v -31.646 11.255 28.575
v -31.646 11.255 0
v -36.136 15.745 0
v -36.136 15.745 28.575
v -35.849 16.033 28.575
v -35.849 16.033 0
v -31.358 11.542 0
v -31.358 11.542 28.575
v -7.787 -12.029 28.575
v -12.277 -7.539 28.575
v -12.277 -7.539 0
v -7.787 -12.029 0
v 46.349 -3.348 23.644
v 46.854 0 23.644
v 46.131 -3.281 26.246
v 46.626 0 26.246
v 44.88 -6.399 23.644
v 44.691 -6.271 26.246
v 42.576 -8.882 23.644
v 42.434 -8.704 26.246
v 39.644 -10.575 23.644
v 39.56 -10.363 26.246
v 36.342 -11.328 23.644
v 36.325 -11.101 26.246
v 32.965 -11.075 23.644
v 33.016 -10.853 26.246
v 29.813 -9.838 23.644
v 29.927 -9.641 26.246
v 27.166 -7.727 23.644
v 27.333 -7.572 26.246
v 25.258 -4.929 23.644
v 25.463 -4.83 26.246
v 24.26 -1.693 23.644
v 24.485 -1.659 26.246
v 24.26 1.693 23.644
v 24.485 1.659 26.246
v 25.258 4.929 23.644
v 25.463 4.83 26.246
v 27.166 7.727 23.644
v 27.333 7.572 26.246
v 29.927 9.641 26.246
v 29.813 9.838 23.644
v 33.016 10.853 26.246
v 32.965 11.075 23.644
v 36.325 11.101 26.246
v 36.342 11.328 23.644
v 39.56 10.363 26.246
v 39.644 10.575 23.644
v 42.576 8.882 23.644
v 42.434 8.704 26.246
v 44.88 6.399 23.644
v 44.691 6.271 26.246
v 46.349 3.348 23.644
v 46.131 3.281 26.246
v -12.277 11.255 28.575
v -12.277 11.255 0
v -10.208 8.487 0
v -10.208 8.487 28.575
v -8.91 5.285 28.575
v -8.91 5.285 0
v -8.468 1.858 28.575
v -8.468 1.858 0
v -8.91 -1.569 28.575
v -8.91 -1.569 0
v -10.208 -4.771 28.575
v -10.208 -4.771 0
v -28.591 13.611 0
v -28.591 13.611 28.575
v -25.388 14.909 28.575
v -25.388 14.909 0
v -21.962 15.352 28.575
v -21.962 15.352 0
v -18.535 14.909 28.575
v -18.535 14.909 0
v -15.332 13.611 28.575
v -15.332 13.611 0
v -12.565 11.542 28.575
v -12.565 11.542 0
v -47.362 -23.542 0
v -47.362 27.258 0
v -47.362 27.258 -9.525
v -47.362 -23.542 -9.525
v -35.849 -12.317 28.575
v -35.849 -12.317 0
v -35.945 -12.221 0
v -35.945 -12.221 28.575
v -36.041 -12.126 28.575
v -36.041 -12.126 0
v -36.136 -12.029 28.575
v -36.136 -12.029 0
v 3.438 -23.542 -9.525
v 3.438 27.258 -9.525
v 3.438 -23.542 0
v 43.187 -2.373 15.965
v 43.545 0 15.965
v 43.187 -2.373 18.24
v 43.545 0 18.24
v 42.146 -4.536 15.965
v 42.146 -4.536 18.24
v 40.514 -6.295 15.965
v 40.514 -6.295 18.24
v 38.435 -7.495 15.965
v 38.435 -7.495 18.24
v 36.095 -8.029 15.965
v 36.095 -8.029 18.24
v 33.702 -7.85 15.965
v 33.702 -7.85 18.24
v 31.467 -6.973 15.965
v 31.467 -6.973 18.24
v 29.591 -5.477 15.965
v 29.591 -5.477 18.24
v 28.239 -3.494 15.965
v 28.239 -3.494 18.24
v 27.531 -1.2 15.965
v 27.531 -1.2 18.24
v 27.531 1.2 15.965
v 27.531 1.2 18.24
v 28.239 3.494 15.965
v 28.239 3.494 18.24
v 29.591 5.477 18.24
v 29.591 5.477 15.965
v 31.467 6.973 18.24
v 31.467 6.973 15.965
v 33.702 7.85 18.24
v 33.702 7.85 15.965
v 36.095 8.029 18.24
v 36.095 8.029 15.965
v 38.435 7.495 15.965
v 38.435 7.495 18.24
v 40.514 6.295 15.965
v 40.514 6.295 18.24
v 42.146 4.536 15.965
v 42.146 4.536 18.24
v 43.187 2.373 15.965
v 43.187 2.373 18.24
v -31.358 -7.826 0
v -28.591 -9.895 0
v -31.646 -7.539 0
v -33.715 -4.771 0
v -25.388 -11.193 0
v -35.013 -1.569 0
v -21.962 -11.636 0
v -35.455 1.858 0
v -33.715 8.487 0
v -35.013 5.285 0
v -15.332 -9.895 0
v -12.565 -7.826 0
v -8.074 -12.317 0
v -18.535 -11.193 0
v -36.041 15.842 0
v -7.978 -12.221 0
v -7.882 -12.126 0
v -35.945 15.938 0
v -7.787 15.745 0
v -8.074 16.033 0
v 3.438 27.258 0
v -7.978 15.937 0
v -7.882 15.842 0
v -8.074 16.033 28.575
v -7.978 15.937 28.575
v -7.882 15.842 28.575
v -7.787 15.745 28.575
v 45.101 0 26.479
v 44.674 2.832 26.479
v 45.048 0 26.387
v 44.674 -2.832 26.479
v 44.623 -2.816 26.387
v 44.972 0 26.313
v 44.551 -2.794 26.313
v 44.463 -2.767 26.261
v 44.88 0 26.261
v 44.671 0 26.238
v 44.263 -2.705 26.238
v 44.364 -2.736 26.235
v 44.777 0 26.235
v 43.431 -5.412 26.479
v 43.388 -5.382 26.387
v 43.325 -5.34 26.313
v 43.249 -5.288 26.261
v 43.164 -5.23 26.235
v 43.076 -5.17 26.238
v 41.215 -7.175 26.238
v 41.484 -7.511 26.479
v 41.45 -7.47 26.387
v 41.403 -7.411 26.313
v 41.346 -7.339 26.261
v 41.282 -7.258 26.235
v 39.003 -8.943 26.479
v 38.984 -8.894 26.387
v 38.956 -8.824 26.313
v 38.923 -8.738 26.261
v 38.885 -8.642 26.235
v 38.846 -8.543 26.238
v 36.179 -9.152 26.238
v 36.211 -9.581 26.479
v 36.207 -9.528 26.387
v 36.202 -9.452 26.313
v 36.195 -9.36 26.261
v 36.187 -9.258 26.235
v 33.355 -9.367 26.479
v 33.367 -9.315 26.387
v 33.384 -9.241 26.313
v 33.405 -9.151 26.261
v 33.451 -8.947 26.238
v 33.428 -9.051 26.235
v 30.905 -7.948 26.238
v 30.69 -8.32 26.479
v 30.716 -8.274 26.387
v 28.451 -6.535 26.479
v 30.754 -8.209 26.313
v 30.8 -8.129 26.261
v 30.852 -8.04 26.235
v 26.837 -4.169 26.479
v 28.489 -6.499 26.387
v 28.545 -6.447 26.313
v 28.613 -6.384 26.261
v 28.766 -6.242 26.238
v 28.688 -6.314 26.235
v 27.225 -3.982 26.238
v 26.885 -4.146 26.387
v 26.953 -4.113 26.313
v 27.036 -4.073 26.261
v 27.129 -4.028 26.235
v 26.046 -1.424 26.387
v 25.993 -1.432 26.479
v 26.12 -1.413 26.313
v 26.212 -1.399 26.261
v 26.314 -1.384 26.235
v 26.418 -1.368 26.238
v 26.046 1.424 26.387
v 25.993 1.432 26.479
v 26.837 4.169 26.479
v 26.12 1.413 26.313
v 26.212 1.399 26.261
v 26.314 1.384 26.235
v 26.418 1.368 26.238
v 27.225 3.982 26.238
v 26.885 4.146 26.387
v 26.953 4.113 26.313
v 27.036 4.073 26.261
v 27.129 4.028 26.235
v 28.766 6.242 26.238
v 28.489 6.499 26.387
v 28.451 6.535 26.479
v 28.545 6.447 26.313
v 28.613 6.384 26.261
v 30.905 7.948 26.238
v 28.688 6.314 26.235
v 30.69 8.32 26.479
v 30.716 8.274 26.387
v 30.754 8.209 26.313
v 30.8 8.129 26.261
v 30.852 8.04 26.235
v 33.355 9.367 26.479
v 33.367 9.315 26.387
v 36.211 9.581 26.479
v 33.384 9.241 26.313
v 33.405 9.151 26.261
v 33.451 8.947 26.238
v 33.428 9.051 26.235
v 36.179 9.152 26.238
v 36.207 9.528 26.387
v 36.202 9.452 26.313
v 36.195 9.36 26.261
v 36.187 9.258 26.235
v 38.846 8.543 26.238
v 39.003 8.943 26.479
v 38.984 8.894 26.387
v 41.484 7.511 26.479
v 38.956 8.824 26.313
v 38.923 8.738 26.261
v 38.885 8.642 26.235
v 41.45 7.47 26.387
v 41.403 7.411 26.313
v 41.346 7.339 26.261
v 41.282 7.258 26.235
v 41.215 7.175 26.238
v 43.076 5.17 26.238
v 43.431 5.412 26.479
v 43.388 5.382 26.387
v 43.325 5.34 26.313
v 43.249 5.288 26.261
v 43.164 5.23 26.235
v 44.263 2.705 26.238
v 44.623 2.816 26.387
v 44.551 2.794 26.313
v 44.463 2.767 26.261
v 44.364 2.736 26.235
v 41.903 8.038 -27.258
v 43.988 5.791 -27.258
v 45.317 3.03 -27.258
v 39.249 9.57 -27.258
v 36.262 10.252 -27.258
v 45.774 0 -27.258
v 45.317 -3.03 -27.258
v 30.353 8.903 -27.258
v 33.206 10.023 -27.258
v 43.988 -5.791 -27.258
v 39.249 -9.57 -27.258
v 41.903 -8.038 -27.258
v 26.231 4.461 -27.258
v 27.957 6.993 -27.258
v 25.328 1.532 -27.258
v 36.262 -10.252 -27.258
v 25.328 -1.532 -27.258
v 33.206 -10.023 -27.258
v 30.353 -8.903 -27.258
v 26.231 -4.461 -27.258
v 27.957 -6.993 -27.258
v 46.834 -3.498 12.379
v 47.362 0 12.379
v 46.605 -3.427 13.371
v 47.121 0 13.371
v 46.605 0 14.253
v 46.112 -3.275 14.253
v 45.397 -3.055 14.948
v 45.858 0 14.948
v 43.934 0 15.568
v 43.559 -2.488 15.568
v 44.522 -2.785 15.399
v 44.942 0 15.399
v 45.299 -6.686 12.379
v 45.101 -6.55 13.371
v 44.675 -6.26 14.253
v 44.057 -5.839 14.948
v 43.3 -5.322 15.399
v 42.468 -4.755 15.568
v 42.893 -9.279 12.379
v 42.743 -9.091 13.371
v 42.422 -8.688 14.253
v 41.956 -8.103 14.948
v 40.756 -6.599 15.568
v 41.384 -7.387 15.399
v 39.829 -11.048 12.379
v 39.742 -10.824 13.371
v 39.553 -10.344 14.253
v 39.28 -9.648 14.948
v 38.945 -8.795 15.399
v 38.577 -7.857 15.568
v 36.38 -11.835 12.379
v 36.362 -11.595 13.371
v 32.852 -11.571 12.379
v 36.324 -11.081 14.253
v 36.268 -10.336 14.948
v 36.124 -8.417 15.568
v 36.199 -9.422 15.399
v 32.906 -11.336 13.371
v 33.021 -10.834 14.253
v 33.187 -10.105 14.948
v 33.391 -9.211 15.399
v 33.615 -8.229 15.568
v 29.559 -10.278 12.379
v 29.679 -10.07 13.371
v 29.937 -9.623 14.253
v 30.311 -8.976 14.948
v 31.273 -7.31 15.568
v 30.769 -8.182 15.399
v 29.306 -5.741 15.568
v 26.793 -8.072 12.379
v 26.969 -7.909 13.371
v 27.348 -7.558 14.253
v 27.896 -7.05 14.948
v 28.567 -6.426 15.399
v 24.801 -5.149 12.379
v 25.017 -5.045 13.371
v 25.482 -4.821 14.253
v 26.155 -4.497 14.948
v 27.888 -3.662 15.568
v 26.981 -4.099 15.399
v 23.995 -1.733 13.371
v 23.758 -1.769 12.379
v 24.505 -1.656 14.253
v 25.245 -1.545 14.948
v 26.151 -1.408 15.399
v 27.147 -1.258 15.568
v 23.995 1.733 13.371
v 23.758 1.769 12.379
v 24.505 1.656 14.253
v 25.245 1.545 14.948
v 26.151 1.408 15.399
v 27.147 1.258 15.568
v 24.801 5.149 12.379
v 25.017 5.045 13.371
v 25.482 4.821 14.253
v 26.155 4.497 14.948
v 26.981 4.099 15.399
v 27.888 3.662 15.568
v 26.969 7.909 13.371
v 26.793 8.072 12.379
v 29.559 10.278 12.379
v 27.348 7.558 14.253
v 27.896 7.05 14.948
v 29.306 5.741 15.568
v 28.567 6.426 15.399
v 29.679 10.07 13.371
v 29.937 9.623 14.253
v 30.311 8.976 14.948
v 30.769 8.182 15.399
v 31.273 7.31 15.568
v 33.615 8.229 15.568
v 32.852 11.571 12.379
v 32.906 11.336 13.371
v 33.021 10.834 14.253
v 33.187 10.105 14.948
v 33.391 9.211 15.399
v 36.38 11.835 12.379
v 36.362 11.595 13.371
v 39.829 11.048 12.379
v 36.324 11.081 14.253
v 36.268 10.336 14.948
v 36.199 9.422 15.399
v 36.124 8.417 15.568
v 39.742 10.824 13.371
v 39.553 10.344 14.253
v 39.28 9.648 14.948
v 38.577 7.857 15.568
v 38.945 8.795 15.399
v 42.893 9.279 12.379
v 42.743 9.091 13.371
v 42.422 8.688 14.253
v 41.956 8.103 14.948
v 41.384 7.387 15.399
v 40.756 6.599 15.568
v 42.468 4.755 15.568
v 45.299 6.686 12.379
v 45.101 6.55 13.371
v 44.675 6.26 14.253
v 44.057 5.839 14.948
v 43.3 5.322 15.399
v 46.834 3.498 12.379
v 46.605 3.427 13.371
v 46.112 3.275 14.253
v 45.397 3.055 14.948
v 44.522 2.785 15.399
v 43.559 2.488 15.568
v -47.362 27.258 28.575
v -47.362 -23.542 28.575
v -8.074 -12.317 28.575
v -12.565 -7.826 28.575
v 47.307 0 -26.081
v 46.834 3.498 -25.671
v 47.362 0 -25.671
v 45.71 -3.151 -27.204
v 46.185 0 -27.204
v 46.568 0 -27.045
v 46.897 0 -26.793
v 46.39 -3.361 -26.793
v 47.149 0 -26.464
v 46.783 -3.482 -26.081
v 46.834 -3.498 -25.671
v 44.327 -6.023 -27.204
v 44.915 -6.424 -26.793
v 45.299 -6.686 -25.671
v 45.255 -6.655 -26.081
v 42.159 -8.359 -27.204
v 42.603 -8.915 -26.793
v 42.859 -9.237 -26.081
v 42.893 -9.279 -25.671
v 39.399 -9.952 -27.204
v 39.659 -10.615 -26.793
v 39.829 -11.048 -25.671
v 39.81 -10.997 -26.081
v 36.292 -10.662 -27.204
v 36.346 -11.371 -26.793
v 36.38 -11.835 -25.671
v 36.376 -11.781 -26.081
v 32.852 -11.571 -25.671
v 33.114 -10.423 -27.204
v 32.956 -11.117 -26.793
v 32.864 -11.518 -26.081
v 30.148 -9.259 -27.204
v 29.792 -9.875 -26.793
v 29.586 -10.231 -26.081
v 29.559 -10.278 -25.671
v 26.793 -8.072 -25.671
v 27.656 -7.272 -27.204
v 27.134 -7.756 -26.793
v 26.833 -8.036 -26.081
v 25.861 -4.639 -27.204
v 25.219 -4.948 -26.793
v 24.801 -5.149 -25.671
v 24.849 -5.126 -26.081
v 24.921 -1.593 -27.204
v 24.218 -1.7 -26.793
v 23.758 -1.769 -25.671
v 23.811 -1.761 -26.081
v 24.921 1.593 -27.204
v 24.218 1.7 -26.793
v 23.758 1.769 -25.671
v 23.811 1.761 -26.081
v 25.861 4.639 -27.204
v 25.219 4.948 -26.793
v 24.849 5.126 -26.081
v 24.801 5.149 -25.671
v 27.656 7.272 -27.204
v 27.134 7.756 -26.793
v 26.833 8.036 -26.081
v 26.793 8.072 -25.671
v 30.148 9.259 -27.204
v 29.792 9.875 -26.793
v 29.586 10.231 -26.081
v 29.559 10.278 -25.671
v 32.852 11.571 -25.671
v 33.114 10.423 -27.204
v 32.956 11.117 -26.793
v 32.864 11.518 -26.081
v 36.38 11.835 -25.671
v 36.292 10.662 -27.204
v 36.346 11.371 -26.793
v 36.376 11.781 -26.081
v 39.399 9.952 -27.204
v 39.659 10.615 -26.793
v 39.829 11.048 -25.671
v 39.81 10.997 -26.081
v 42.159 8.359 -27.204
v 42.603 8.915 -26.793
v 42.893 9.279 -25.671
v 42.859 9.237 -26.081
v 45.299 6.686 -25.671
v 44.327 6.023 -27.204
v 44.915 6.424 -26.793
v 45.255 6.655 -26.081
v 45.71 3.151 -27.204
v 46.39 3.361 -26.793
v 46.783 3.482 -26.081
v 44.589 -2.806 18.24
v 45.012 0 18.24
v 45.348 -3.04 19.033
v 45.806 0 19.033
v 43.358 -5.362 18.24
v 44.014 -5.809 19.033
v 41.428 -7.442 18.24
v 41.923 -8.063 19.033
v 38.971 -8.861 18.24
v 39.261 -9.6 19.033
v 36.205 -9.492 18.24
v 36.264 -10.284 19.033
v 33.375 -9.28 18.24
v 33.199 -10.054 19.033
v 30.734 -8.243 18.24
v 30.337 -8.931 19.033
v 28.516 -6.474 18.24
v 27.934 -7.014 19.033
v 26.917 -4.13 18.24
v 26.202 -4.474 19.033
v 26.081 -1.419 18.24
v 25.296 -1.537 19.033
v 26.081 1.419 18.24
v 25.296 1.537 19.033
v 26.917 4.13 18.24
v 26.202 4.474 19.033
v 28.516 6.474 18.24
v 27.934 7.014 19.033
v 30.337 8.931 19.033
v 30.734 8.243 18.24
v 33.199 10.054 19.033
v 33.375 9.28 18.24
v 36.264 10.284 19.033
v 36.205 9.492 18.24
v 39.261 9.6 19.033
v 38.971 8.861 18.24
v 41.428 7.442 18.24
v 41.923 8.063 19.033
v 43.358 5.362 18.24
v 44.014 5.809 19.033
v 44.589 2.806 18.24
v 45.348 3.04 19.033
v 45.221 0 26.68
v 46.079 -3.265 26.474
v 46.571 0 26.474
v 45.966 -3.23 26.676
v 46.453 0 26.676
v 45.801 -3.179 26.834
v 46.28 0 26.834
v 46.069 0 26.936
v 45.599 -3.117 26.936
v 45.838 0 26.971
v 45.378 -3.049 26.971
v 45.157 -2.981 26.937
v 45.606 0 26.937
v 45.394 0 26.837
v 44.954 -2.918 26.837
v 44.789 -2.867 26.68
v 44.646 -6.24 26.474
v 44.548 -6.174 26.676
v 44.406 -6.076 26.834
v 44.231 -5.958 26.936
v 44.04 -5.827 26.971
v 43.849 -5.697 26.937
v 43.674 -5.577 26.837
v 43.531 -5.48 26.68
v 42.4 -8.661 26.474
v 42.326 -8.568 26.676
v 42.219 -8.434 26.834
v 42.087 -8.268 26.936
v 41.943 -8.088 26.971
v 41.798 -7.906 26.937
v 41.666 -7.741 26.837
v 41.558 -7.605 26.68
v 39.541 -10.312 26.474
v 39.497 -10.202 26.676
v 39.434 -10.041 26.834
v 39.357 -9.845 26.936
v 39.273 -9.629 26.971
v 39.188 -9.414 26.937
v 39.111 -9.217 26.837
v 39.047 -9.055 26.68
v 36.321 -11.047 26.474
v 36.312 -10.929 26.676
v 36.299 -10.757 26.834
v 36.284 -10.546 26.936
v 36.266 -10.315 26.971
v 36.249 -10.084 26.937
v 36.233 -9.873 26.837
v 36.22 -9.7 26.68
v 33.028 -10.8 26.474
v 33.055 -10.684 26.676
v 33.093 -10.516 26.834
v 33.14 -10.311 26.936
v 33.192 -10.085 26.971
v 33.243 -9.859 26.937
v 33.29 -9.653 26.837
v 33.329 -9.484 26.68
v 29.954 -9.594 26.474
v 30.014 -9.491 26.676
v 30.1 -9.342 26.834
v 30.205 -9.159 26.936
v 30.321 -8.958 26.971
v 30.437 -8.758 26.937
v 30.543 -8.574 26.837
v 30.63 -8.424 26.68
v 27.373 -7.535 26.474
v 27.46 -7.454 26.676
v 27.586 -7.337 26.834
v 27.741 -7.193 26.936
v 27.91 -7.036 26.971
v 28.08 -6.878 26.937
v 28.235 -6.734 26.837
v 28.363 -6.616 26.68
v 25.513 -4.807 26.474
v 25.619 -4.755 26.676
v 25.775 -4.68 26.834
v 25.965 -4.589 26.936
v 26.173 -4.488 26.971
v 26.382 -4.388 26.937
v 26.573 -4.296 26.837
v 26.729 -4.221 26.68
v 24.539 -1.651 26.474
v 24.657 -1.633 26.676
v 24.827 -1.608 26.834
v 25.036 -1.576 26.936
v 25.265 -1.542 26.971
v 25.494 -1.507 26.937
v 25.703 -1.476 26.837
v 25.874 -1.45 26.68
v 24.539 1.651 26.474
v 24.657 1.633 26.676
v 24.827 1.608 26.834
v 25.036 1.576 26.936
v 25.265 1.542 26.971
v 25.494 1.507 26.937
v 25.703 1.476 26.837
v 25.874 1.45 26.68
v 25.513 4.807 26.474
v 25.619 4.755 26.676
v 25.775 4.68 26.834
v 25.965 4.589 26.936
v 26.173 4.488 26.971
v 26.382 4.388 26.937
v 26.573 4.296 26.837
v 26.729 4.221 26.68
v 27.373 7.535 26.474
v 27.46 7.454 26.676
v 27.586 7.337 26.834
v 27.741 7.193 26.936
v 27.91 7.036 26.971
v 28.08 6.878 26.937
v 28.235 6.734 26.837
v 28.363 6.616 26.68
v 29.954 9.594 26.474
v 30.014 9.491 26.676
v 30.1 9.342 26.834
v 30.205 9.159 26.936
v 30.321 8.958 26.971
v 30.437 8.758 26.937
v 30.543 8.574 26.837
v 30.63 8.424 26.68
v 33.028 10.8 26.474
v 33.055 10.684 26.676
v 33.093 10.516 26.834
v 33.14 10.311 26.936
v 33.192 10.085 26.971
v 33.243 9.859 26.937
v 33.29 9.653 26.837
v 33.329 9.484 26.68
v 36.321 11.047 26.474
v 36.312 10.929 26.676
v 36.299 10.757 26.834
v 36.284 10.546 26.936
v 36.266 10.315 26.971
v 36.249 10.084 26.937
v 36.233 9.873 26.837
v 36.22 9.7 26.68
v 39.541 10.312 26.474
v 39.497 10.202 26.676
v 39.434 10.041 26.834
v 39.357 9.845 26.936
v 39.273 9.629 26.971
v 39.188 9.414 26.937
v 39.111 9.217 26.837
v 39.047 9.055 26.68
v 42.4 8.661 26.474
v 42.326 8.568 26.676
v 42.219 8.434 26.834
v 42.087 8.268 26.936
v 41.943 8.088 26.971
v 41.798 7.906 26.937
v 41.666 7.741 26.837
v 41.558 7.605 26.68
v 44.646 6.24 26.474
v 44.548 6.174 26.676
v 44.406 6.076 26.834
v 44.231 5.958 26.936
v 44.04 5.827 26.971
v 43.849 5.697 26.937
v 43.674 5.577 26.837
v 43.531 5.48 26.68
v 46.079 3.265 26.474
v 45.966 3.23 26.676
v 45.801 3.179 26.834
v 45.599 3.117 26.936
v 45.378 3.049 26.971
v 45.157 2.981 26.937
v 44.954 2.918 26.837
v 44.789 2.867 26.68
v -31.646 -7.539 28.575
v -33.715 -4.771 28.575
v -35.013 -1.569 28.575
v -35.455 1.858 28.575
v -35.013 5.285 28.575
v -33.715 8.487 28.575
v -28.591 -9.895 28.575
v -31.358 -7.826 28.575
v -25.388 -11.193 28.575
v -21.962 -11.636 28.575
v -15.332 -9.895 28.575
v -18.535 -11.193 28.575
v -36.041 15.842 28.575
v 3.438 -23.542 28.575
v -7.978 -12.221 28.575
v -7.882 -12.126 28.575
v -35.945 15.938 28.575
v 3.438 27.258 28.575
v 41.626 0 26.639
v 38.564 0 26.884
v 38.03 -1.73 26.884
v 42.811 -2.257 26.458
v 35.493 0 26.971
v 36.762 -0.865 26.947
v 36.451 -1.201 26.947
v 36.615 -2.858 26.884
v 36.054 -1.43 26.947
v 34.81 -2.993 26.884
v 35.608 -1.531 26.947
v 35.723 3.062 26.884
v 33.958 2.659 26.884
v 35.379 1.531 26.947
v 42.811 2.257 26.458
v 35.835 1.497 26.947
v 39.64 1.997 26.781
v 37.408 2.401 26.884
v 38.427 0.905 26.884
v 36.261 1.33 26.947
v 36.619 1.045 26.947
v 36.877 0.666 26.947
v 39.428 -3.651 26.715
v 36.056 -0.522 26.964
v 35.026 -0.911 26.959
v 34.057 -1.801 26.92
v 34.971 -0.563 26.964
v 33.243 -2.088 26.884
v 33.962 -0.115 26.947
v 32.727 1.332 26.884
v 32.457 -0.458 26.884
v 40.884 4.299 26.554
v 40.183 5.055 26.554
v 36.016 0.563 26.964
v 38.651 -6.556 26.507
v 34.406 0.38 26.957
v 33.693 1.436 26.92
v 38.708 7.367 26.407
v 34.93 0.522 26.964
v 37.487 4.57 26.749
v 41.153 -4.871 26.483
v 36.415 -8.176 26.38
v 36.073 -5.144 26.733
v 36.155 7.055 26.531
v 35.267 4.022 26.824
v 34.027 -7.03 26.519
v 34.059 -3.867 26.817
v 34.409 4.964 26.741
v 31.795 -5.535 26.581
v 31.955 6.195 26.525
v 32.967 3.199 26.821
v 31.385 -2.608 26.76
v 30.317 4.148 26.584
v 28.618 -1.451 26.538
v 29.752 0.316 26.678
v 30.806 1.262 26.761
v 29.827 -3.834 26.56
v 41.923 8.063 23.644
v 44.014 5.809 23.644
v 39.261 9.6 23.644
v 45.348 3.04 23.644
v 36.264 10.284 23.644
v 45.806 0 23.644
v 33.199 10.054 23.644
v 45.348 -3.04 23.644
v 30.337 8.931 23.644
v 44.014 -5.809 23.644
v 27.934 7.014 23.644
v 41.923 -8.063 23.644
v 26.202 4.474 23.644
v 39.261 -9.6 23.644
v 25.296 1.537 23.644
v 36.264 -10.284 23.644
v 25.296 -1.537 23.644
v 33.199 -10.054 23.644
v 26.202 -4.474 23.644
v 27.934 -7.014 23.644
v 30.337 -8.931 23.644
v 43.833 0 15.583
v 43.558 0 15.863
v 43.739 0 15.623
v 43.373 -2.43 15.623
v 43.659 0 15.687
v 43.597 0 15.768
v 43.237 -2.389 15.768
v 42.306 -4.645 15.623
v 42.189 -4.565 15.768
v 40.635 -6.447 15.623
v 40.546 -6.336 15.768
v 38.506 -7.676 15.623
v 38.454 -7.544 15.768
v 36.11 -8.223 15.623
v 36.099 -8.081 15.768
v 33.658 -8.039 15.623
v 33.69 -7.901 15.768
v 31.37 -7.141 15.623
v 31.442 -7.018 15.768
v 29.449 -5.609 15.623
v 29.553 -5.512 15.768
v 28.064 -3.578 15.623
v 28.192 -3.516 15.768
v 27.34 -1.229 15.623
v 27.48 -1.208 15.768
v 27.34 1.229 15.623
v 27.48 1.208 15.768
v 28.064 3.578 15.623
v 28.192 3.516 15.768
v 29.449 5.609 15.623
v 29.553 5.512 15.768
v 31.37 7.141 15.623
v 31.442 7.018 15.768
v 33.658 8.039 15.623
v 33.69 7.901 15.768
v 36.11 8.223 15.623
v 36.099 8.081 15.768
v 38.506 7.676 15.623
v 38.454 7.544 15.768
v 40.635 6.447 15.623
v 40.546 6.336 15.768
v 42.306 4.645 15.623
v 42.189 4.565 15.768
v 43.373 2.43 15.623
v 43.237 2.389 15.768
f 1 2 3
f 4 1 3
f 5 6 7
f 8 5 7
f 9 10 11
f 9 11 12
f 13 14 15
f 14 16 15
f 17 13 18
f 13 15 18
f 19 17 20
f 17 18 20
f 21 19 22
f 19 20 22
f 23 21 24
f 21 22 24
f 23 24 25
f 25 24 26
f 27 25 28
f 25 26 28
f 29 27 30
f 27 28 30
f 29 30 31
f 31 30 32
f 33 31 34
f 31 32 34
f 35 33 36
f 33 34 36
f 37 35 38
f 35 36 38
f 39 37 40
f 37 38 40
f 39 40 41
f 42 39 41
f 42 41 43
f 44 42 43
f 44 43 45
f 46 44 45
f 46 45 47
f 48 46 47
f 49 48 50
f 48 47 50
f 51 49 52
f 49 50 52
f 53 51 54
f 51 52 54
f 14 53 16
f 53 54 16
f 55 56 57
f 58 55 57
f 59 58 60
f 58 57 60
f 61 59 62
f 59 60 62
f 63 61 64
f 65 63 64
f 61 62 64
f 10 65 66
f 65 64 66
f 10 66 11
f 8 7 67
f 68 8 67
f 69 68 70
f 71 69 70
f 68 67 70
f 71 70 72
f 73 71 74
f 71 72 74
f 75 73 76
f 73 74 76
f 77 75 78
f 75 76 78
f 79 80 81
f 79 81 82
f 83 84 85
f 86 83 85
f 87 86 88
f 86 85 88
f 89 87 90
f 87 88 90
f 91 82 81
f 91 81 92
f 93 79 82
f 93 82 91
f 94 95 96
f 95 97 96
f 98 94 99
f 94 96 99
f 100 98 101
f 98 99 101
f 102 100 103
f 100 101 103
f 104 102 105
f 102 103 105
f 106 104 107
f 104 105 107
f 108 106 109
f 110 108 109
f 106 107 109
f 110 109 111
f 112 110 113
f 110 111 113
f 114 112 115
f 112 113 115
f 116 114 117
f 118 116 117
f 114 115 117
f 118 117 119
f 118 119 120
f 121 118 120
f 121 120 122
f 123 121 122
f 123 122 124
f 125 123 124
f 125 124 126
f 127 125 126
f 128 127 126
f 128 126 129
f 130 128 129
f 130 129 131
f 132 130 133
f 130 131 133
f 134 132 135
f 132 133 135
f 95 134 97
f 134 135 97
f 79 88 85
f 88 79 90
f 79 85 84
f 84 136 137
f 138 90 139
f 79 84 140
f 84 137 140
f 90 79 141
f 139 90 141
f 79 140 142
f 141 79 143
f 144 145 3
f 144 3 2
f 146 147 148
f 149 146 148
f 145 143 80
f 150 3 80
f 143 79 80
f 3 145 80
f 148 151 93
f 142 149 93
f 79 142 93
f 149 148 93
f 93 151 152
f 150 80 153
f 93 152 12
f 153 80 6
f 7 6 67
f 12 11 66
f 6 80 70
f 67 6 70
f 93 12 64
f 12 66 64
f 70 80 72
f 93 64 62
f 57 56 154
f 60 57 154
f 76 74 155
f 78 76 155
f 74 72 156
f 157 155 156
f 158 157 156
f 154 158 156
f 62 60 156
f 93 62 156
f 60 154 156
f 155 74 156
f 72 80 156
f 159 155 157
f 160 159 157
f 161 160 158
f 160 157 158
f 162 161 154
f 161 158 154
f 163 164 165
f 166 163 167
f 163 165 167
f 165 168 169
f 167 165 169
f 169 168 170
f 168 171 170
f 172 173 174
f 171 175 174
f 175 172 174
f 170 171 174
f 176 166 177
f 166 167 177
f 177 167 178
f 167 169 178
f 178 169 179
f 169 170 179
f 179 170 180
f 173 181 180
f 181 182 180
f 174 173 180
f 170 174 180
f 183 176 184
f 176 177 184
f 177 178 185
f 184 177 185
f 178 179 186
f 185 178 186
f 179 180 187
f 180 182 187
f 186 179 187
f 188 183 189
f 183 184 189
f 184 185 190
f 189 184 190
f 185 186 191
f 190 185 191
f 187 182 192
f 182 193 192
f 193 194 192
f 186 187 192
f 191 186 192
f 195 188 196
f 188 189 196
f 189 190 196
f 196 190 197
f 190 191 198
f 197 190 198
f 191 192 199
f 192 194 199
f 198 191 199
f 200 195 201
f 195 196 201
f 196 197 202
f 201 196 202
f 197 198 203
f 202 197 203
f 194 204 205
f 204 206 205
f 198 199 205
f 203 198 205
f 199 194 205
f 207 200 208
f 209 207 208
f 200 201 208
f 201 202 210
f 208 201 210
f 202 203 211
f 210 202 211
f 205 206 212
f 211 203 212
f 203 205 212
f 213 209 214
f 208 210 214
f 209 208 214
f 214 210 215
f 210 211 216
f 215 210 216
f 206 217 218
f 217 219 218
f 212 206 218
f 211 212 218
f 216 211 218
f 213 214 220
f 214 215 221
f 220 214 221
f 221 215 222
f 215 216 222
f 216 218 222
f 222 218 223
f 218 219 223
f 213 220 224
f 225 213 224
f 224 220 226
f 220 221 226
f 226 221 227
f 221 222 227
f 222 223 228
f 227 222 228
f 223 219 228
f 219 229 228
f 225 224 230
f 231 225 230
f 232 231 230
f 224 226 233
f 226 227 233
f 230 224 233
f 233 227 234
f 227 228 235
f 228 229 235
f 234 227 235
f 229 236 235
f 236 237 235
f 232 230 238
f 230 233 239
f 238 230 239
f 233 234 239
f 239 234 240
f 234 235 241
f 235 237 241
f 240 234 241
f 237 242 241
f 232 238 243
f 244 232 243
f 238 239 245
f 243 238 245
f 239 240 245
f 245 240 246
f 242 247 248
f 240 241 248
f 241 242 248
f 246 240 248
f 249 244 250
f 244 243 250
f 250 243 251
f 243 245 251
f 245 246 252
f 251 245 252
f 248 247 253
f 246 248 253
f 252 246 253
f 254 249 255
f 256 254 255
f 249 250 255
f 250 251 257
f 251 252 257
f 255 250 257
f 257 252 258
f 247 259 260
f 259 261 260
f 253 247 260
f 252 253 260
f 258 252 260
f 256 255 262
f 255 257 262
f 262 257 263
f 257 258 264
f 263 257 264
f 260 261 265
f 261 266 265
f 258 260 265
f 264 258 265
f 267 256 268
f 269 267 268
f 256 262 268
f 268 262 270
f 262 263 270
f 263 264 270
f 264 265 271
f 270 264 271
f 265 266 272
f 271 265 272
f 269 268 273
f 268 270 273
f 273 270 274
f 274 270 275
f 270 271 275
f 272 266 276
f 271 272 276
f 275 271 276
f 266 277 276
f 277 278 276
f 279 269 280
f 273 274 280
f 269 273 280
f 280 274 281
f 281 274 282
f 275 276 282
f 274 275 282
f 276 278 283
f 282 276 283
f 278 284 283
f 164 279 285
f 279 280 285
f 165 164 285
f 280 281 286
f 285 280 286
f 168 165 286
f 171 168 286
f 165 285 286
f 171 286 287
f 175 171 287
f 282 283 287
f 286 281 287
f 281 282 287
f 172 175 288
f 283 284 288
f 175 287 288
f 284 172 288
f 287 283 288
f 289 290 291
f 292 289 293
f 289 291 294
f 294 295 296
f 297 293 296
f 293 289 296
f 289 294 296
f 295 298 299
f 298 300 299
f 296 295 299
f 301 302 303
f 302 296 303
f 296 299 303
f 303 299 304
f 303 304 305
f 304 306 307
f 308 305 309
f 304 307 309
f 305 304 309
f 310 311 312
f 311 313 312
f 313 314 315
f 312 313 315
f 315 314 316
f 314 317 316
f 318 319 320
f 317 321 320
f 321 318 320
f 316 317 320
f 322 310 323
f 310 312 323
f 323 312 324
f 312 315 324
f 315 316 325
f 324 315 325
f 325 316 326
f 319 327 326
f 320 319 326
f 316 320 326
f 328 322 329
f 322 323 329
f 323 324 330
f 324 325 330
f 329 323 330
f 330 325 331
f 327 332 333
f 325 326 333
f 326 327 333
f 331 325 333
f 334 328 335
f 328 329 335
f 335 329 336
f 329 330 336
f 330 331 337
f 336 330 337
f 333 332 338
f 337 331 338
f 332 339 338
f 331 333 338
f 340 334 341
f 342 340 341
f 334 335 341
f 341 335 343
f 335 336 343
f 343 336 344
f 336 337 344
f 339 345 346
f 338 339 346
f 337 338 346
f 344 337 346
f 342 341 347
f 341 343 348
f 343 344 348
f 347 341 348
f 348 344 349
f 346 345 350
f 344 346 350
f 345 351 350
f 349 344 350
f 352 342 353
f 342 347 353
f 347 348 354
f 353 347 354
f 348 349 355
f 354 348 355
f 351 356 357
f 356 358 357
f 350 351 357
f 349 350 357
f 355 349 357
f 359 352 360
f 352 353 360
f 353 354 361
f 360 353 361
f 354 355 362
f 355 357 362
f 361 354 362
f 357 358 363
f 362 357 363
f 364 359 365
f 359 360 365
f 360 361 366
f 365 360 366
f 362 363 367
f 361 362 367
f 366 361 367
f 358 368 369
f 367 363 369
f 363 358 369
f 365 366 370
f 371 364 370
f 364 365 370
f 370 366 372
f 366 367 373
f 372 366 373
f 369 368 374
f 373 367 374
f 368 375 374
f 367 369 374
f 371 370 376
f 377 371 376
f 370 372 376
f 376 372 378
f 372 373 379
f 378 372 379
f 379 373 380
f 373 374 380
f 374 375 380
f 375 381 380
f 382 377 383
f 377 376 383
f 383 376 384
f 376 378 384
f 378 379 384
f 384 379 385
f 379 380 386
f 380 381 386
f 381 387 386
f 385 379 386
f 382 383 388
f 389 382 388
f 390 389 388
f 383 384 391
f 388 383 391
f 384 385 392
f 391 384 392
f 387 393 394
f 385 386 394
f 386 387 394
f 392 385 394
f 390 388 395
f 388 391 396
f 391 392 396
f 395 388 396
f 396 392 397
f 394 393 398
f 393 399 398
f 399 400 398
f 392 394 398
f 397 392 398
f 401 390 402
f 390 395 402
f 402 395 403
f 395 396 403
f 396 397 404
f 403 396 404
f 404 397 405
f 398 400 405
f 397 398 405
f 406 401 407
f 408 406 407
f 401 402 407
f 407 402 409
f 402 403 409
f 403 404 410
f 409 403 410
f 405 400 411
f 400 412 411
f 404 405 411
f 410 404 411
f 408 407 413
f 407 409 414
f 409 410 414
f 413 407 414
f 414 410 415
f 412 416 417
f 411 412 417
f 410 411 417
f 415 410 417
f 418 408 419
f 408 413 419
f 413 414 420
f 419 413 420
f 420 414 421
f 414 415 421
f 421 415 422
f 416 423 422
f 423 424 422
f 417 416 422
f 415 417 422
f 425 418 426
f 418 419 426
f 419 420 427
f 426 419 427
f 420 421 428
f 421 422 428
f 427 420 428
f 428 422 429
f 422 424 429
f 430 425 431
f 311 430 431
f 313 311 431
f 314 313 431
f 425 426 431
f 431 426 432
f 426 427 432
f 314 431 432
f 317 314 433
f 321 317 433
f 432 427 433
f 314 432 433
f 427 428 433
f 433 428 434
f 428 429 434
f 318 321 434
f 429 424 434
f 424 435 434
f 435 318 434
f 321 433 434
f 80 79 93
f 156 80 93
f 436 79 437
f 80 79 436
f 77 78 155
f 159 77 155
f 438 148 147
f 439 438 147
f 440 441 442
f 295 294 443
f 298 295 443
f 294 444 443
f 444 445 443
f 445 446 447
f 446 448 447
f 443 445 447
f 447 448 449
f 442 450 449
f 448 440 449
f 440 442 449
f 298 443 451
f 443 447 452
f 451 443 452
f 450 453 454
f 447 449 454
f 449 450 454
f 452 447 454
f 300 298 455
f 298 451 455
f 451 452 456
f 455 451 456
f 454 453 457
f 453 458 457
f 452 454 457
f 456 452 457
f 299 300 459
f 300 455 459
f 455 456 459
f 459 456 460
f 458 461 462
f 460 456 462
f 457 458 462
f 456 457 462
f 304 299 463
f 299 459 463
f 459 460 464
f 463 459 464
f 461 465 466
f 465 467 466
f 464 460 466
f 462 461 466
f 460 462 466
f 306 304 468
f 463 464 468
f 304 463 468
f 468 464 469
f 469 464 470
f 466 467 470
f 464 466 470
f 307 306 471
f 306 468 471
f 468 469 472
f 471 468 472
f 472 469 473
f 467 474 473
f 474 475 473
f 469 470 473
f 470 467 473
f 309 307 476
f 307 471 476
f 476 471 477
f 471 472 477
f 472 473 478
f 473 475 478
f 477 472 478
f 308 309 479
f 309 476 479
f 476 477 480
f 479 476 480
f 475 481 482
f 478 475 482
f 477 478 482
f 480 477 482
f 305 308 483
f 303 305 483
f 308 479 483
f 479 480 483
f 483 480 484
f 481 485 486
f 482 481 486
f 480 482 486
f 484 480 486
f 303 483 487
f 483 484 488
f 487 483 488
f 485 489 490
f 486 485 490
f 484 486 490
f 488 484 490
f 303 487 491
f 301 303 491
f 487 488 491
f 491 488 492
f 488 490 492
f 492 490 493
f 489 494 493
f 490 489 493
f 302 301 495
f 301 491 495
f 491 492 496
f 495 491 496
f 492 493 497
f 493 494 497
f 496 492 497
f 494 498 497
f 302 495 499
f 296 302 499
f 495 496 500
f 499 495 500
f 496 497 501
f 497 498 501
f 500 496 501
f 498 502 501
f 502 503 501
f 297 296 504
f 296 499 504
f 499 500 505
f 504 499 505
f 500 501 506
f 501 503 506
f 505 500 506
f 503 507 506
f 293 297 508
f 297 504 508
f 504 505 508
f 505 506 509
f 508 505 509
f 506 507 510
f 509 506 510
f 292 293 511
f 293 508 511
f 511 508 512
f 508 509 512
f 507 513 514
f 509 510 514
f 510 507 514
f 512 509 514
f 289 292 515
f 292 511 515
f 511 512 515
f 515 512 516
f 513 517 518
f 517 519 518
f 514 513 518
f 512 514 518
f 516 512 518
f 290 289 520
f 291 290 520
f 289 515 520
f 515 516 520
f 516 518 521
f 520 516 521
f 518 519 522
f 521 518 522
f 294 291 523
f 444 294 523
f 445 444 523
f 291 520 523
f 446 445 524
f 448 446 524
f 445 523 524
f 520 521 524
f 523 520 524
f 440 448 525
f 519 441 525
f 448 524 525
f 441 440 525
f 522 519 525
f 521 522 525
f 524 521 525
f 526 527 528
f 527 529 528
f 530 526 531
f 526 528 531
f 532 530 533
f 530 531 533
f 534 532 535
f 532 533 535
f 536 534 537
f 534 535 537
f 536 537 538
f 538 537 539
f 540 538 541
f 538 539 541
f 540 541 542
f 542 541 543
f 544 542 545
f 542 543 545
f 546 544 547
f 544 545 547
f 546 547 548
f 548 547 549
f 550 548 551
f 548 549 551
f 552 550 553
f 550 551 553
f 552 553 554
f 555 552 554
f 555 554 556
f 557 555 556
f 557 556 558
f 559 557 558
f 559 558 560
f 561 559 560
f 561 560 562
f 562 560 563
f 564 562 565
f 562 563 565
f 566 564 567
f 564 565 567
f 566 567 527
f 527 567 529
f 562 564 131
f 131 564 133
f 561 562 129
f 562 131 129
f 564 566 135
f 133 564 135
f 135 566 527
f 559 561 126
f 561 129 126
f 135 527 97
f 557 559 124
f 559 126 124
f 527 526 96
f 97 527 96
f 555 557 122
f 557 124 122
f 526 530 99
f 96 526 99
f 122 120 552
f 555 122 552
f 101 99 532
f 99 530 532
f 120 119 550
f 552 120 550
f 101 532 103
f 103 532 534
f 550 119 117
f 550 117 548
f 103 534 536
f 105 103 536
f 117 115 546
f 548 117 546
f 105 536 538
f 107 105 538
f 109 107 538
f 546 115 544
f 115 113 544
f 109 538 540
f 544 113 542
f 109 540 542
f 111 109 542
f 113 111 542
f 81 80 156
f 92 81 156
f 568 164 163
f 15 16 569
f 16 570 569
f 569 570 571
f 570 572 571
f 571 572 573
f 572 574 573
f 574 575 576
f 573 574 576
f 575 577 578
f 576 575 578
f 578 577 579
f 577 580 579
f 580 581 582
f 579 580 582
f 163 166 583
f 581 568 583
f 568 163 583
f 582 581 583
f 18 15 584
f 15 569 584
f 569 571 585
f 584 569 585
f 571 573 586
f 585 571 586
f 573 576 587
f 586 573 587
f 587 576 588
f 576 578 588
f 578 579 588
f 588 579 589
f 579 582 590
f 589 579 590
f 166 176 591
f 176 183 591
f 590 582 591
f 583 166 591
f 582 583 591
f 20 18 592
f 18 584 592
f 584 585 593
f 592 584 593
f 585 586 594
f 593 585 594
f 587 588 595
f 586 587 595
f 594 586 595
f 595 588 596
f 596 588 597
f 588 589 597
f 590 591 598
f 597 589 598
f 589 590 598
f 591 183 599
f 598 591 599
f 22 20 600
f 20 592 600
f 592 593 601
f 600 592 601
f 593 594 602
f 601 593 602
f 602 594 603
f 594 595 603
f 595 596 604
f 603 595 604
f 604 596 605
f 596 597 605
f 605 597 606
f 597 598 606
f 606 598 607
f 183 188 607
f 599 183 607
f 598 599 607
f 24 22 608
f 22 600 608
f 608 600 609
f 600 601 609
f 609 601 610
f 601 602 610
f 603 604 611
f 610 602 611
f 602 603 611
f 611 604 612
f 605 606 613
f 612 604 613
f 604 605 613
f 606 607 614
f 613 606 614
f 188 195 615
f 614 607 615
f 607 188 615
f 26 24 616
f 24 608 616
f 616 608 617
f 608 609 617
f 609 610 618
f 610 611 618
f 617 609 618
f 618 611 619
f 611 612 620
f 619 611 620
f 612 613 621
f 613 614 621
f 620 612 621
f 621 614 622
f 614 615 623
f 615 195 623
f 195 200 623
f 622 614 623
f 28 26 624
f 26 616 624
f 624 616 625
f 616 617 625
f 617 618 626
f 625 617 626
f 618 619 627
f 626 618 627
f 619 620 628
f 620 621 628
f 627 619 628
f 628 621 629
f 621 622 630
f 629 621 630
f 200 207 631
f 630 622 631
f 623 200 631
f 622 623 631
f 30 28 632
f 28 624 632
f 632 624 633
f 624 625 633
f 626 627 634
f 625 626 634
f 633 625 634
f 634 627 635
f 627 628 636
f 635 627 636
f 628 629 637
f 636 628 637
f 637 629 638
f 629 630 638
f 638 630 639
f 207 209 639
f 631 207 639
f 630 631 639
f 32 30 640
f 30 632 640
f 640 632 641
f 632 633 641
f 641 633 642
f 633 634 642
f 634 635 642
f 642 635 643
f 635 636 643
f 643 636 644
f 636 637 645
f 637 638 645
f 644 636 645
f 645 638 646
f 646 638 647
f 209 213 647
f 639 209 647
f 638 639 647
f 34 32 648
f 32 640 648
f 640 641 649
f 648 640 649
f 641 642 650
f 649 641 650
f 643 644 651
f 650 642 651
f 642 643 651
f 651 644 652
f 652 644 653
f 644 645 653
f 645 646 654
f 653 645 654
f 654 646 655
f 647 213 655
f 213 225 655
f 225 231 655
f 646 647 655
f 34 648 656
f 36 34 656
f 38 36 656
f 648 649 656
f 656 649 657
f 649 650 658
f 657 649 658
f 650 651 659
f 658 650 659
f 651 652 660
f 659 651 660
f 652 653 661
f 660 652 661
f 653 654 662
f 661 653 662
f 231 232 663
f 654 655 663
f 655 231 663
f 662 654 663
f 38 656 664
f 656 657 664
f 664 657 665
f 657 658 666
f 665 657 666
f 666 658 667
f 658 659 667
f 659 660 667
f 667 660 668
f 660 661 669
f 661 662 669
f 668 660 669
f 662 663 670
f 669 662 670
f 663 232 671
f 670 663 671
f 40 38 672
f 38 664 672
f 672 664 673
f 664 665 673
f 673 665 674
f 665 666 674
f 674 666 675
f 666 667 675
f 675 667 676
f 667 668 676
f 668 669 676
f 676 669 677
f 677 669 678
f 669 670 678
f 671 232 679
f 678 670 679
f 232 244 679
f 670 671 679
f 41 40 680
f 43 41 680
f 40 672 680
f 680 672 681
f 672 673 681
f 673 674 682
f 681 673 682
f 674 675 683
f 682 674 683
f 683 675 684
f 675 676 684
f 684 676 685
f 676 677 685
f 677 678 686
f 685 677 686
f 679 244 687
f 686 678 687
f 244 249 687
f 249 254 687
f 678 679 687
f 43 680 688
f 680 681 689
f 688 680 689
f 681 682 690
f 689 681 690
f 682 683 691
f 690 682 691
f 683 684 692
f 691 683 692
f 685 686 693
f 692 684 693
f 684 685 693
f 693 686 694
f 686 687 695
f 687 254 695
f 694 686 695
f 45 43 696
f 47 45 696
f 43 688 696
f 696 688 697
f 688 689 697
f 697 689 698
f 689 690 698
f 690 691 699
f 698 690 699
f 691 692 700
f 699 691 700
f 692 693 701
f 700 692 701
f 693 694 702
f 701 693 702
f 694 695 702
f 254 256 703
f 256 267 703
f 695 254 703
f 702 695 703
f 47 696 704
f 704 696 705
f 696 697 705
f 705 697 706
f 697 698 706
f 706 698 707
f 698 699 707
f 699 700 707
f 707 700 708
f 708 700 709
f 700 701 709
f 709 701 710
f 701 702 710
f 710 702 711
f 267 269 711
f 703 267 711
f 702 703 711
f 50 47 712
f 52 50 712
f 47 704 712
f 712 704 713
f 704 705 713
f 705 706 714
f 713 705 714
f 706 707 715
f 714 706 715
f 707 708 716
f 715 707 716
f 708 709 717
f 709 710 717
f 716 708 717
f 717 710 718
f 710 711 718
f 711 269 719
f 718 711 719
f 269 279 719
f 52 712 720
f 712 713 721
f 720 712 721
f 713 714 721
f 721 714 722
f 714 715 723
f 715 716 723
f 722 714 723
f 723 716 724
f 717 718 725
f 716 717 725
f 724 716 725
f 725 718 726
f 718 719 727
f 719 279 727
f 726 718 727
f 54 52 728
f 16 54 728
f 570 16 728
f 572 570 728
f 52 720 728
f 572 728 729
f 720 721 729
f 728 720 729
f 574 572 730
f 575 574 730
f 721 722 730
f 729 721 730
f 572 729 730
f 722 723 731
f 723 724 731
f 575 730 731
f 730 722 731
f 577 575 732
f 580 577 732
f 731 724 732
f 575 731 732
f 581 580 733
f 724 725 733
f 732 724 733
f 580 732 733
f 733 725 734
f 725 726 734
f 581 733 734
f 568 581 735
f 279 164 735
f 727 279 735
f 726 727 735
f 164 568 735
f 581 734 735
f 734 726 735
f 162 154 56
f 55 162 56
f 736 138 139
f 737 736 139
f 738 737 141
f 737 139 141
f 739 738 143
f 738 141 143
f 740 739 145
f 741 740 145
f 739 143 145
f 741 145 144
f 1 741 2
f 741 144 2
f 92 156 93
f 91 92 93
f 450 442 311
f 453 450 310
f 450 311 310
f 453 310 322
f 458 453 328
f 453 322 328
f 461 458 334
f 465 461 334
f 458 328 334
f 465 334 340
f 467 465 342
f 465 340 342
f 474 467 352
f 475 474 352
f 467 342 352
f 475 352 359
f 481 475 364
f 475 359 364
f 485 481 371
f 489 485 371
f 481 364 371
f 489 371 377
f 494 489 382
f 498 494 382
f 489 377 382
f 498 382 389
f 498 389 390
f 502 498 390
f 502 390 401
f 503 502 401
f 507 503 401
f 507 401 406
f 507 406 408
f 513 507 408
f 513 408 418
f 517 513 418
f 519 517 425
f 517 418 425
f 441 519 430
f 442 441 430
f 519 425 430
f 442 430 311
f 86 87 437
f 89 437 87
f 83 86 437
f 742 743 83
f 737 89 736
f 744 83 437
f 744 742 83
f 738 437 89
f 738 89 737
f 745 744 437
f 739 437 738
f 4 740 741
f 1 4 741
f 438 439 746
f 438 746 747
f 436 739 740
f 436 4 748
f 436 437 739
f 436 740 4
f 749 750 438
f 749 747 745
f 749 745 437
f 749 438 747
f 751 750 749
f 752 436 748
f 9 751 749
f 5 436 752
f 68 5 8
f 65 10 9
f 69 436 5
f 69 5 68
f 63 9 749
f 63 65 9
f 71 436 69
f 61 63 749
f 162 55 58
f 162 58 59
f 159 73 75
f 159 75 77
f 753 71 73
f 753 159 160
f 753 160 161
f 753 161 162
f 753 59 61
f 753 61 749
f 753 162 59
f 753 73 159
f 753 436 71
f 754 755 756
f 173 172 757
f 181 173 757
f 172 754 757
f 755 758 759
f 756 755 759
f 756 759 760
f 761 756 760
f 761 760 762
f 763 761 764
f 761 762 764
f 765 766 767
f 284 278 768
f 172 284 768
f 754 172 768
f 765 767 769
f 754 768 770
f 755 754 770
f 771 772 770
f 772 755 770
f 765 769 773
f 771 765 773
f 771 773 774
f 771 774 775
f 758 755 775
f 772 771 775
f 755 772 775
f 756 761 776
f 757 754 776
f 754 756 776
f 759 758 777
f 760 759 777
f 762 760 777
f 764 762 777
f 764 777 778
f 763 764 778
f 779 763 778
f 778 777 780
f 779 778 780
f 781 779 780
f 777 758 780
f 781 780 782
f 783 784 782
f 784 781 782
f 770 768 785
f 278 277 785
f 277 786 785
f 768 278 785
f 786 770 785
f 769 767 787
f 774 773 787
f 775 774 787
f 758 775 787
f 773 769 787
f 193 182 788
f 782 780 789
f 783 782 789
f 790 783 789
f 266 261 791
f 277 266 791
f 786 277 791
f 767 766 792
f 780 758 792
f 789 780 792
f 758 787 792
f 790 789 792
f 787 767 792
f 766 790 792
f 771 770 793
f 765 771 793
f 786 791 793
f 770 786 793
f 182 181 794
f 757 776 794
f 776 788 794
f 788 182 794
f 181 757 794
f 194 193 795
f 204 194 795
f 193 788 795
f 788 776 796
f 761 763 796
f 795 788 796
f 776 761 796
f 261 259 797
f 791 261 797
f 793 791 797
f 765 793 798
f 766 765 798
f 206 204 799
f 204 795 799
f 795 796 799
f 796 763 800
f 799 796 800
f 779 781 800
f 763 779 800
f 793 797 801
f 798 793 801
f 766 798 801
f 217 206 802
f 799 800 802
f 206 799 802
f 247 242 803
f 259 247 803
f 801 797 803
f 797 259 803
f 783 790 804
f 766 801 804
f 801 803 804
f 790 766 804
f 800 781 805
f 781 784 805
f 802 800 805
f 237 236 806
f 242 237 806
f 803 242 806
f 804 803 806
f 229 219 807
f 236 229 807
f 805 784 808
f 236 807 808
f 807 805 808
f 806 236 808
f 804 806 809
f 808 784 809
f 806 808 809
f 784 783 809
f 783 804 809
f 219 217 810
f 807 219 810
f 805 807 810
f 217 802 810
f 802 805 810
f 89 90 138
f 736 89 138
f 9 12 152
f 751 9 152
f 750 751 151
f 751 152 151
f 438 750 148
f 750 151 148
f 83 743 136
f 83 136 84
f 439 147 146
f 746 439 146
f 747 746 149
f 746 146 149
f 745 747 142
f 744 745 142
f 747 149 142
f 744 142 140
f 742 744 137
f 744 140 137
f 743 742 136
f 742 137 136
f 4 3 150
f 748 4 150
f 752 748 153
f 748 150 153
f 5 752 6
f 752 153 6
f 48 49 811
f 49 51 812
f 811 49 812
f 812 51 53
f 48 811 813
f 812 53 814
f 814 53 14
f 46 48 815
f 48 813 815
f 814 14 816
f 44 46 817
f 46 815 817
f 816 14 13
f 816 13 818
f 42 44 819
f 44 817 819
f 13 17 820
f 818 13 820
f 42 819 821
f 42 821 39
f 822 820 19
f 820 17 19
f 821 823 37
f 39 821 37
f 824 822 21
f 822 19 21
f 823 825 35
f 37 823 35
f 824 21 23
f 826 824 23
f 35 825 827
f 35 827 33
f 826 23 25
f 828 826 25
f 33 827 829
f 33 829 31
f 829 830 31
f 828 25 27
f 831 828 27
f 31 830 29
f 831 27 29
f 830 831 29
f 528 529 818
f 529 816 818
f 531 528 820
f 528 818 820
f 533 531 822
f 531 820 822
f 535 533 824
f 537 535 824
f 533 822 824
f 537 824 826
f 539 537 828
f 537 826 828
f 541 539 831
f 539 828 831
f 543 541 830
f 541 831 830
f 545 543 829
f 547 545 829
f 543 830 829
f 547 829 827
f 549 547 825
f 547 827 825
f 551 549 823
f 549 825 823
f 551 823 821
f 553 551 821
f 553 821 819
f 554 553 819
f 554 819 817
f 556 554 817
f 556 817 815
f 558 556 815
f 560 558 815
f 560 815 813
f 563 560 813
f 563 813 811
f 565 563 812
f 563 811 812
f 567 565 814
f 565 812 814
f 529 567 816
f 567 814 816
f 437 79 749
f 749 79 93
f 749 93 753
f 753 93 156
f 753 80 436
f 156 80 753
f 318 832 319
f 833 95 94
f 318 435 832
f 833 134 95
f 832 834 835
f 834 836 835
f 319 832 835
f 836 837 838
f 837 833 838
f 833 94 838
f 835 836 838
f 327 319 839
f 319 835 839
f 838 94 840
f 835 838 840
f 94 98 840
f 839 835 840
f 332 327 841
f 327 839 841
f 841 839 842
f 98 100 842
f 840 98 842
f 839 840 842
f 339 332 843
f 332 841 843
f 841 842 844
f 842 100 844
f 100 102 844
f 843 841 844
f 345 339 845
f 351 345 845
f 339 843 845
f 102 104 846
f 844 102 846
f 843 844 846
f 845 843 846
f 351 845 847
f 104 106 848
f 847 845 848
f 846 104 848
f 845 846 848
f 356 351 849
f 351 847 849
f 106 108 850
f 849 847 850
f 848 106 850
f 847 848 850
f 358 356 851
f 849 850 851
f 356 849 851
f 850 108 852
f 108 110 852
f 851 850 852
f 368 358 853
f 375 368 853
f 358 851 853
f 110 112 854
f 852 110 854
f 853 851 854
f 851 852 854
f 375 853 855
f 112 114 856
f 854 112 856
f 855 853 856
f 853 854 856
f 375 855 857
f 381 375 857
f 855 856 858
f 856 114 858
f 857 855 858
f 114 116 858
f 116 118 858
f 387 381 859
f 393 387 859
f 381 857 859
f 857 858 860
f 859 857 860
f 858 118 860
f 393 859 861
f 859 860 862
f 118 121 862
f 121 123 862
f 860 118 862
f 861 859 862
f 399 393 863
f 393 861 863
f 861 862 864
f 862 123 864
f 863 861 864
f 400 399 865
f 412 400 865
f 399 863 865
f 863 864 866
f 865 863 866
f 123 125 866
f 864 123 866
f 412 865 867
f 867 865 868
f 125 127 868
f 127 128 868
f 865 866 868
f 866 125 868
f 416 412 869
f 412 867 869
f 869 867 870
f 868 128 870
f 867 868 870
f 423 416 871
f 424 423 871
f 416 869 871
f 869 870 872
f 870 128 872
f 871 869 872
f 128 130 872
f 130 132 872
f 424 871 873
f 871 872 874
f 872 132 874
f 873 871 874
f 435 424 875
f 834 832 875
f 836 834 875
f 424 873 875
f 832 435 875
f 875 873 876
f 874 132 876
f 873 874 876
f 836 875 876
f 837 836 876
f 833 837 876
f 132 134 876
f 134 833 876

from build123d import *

# Parameters (mm, degrees)
F0_W     = 50.8
F0_H     = 50.8
F1_DEPTH = 28.575
F2_W     = 50.8
F2_H     = 50.8
F3_DEPTH = 9.525


# Not quite as in the source:
# - ends of sketch curves that miss each other by under 0.0002 mm in the source are joined


with BuildPart() as f1:
    # F0 (on Top) → F1 (new body)
    with BuildSketch(Plane.XY):
        with Locations((-21.9615258, 1.8580354)):
            Rectangle(F0_W, F0_H)
        with BuildLine():
            ThreePointArc((-31.3582782013, 11.5421633096), (-21.9615258, 15.3517854), (-12.5647733987, 11.5421633096))
            Line((-12.5647733987, 11.5421633096), (-8.074279, 16.0326324))
            ThreePointArc((-8.074279, 16.0326324), (-7.9298691961, 15.8896791745), (-7.7869234772, 15.7452620149))
            Line((-7.7869234772, 15.7452620149), (-12.2773948, 11.2547908))
            ThreePointArc((-12.2773948, 11.2547908), (-8.4677758, 1.8580354), (-12.2773978904, -7.5387170013))
            Line((-12.2773978904, -7.5387170013), (-7.7869288, -12.0292114))
            ThreePointArc((-7.7869288, -12.0292114), (-7.9298756108, -12.1736147892), (-8.074286225, -12.3165542255))
            Line((-8.074286225, -12.3165542255), (-12.5647704, -7.8260956))
            ThreePointArc((-12.5647704, -7.8260956), (-21.9615258, -11.6357146), (-31.3582782013, -7.8260925096))
            Line((-31.3582782013, -7.8260925096), (-35.8487472, -12.3165616))
            ThreePointArc((-35.8487472, -12.3165616), (-35.9931695745, -12.1736212039), (-36.1361154255, -12.029204175))
            Line((-36.1361154255, -12.029204175), (-31.6456314, -7.53872))
            ThreePointArc((-31.6456314, -7.53872), (-35.4552758, 1.8580354), (-31.6456413921, 11.2548004956))
            Line((-31.6456413921, 11.2548004956), (-36.1361228, 15.7452568))
            ThreePointArc((-36.1361228, 15.7452568), (-35.9931759892, 15.8896855892), (-35.8487524149, 16.0326377228))
            Line((-35.8487524149, 16.0326377228), (-31.3582782013, 11.5421633096))
        make_face(mode=Mode.SUBTRACT)
    extrude(amount=F1_DEPTH)


with BuildPart() as f3:
    # F2 (on face) → F3 (new body)
    with BuildSketch(Plane(origin=(0, 0, 0), x_dir=(1, 0, 0), z_dir=(0, 0, -1))):
        with Locations((-21.9615258, -1.8580354)):
            Rectangle(F2_W, F2_H)
    extrude(amount=F3_DEPTH)


with BuildPart() as f5:
    # F4 (on Front) → F5 (revolve)
    with BuildSketch(Plane.XZ):
        with BuildLine():
            Line((35.4933504, 26.97099), (35.4933504, -27.25801))
            Line((35.4933504, -27.25801), (45.7740004, -27.25801))
            ThreePointArc((45.7740004, -27.25801), (46.8965324151, -26.7930420151), (47.3615004, -25.67051))
            Line((47.3615004, -25.67051), (47.3615004, 12.37869))
            ThreePointArc((47.3615004, 12.37869), (46.2571032279, 14.627915971), (43.9342782618, 15.5677037122))
            ThreePointArc((43.9342782618, 15.5677037122), (43.6586666515, 15.6866290767), (43.5451504, 15.9645096))
            Line((43.5451504, 15.9645096), (43.5451504, 18.23974))
            Line((43.5451504, 18.23974), (45.0120004, 18.23974))
            Line((45.0120004, 18.23974), (45.8057504, 19.03349))
            Line((45.8057504, 19.03349), (45.8057504, 23.64359))
            Line((45.8057504, 23.64359), (46.8535004, 23.64359))
            Line((46.8535004, 23.64359), (46.6257894, 26.2464296))
            ThreePointArc((46.6257894, 26.2464296), (45.954733078, 26.9619169371), (45.1009053301, 26.4789899736))
            ThreePointArc((45.1009053301, 26.4789899736), (44.9278136613, 26.2836367625), (44.6708278714, 26.2380238884))
            ThreePointArc((44.6708278714, 26.2380238884), (40.096198354, 26.781168636), (35.4933504, 26.97099))
        make_face()
    revolve(axis=Axis((35.4933504, 0, -0.14351), (0, 0, -1)))


solid = Compound([f1.part, f3.part, f5.part])
